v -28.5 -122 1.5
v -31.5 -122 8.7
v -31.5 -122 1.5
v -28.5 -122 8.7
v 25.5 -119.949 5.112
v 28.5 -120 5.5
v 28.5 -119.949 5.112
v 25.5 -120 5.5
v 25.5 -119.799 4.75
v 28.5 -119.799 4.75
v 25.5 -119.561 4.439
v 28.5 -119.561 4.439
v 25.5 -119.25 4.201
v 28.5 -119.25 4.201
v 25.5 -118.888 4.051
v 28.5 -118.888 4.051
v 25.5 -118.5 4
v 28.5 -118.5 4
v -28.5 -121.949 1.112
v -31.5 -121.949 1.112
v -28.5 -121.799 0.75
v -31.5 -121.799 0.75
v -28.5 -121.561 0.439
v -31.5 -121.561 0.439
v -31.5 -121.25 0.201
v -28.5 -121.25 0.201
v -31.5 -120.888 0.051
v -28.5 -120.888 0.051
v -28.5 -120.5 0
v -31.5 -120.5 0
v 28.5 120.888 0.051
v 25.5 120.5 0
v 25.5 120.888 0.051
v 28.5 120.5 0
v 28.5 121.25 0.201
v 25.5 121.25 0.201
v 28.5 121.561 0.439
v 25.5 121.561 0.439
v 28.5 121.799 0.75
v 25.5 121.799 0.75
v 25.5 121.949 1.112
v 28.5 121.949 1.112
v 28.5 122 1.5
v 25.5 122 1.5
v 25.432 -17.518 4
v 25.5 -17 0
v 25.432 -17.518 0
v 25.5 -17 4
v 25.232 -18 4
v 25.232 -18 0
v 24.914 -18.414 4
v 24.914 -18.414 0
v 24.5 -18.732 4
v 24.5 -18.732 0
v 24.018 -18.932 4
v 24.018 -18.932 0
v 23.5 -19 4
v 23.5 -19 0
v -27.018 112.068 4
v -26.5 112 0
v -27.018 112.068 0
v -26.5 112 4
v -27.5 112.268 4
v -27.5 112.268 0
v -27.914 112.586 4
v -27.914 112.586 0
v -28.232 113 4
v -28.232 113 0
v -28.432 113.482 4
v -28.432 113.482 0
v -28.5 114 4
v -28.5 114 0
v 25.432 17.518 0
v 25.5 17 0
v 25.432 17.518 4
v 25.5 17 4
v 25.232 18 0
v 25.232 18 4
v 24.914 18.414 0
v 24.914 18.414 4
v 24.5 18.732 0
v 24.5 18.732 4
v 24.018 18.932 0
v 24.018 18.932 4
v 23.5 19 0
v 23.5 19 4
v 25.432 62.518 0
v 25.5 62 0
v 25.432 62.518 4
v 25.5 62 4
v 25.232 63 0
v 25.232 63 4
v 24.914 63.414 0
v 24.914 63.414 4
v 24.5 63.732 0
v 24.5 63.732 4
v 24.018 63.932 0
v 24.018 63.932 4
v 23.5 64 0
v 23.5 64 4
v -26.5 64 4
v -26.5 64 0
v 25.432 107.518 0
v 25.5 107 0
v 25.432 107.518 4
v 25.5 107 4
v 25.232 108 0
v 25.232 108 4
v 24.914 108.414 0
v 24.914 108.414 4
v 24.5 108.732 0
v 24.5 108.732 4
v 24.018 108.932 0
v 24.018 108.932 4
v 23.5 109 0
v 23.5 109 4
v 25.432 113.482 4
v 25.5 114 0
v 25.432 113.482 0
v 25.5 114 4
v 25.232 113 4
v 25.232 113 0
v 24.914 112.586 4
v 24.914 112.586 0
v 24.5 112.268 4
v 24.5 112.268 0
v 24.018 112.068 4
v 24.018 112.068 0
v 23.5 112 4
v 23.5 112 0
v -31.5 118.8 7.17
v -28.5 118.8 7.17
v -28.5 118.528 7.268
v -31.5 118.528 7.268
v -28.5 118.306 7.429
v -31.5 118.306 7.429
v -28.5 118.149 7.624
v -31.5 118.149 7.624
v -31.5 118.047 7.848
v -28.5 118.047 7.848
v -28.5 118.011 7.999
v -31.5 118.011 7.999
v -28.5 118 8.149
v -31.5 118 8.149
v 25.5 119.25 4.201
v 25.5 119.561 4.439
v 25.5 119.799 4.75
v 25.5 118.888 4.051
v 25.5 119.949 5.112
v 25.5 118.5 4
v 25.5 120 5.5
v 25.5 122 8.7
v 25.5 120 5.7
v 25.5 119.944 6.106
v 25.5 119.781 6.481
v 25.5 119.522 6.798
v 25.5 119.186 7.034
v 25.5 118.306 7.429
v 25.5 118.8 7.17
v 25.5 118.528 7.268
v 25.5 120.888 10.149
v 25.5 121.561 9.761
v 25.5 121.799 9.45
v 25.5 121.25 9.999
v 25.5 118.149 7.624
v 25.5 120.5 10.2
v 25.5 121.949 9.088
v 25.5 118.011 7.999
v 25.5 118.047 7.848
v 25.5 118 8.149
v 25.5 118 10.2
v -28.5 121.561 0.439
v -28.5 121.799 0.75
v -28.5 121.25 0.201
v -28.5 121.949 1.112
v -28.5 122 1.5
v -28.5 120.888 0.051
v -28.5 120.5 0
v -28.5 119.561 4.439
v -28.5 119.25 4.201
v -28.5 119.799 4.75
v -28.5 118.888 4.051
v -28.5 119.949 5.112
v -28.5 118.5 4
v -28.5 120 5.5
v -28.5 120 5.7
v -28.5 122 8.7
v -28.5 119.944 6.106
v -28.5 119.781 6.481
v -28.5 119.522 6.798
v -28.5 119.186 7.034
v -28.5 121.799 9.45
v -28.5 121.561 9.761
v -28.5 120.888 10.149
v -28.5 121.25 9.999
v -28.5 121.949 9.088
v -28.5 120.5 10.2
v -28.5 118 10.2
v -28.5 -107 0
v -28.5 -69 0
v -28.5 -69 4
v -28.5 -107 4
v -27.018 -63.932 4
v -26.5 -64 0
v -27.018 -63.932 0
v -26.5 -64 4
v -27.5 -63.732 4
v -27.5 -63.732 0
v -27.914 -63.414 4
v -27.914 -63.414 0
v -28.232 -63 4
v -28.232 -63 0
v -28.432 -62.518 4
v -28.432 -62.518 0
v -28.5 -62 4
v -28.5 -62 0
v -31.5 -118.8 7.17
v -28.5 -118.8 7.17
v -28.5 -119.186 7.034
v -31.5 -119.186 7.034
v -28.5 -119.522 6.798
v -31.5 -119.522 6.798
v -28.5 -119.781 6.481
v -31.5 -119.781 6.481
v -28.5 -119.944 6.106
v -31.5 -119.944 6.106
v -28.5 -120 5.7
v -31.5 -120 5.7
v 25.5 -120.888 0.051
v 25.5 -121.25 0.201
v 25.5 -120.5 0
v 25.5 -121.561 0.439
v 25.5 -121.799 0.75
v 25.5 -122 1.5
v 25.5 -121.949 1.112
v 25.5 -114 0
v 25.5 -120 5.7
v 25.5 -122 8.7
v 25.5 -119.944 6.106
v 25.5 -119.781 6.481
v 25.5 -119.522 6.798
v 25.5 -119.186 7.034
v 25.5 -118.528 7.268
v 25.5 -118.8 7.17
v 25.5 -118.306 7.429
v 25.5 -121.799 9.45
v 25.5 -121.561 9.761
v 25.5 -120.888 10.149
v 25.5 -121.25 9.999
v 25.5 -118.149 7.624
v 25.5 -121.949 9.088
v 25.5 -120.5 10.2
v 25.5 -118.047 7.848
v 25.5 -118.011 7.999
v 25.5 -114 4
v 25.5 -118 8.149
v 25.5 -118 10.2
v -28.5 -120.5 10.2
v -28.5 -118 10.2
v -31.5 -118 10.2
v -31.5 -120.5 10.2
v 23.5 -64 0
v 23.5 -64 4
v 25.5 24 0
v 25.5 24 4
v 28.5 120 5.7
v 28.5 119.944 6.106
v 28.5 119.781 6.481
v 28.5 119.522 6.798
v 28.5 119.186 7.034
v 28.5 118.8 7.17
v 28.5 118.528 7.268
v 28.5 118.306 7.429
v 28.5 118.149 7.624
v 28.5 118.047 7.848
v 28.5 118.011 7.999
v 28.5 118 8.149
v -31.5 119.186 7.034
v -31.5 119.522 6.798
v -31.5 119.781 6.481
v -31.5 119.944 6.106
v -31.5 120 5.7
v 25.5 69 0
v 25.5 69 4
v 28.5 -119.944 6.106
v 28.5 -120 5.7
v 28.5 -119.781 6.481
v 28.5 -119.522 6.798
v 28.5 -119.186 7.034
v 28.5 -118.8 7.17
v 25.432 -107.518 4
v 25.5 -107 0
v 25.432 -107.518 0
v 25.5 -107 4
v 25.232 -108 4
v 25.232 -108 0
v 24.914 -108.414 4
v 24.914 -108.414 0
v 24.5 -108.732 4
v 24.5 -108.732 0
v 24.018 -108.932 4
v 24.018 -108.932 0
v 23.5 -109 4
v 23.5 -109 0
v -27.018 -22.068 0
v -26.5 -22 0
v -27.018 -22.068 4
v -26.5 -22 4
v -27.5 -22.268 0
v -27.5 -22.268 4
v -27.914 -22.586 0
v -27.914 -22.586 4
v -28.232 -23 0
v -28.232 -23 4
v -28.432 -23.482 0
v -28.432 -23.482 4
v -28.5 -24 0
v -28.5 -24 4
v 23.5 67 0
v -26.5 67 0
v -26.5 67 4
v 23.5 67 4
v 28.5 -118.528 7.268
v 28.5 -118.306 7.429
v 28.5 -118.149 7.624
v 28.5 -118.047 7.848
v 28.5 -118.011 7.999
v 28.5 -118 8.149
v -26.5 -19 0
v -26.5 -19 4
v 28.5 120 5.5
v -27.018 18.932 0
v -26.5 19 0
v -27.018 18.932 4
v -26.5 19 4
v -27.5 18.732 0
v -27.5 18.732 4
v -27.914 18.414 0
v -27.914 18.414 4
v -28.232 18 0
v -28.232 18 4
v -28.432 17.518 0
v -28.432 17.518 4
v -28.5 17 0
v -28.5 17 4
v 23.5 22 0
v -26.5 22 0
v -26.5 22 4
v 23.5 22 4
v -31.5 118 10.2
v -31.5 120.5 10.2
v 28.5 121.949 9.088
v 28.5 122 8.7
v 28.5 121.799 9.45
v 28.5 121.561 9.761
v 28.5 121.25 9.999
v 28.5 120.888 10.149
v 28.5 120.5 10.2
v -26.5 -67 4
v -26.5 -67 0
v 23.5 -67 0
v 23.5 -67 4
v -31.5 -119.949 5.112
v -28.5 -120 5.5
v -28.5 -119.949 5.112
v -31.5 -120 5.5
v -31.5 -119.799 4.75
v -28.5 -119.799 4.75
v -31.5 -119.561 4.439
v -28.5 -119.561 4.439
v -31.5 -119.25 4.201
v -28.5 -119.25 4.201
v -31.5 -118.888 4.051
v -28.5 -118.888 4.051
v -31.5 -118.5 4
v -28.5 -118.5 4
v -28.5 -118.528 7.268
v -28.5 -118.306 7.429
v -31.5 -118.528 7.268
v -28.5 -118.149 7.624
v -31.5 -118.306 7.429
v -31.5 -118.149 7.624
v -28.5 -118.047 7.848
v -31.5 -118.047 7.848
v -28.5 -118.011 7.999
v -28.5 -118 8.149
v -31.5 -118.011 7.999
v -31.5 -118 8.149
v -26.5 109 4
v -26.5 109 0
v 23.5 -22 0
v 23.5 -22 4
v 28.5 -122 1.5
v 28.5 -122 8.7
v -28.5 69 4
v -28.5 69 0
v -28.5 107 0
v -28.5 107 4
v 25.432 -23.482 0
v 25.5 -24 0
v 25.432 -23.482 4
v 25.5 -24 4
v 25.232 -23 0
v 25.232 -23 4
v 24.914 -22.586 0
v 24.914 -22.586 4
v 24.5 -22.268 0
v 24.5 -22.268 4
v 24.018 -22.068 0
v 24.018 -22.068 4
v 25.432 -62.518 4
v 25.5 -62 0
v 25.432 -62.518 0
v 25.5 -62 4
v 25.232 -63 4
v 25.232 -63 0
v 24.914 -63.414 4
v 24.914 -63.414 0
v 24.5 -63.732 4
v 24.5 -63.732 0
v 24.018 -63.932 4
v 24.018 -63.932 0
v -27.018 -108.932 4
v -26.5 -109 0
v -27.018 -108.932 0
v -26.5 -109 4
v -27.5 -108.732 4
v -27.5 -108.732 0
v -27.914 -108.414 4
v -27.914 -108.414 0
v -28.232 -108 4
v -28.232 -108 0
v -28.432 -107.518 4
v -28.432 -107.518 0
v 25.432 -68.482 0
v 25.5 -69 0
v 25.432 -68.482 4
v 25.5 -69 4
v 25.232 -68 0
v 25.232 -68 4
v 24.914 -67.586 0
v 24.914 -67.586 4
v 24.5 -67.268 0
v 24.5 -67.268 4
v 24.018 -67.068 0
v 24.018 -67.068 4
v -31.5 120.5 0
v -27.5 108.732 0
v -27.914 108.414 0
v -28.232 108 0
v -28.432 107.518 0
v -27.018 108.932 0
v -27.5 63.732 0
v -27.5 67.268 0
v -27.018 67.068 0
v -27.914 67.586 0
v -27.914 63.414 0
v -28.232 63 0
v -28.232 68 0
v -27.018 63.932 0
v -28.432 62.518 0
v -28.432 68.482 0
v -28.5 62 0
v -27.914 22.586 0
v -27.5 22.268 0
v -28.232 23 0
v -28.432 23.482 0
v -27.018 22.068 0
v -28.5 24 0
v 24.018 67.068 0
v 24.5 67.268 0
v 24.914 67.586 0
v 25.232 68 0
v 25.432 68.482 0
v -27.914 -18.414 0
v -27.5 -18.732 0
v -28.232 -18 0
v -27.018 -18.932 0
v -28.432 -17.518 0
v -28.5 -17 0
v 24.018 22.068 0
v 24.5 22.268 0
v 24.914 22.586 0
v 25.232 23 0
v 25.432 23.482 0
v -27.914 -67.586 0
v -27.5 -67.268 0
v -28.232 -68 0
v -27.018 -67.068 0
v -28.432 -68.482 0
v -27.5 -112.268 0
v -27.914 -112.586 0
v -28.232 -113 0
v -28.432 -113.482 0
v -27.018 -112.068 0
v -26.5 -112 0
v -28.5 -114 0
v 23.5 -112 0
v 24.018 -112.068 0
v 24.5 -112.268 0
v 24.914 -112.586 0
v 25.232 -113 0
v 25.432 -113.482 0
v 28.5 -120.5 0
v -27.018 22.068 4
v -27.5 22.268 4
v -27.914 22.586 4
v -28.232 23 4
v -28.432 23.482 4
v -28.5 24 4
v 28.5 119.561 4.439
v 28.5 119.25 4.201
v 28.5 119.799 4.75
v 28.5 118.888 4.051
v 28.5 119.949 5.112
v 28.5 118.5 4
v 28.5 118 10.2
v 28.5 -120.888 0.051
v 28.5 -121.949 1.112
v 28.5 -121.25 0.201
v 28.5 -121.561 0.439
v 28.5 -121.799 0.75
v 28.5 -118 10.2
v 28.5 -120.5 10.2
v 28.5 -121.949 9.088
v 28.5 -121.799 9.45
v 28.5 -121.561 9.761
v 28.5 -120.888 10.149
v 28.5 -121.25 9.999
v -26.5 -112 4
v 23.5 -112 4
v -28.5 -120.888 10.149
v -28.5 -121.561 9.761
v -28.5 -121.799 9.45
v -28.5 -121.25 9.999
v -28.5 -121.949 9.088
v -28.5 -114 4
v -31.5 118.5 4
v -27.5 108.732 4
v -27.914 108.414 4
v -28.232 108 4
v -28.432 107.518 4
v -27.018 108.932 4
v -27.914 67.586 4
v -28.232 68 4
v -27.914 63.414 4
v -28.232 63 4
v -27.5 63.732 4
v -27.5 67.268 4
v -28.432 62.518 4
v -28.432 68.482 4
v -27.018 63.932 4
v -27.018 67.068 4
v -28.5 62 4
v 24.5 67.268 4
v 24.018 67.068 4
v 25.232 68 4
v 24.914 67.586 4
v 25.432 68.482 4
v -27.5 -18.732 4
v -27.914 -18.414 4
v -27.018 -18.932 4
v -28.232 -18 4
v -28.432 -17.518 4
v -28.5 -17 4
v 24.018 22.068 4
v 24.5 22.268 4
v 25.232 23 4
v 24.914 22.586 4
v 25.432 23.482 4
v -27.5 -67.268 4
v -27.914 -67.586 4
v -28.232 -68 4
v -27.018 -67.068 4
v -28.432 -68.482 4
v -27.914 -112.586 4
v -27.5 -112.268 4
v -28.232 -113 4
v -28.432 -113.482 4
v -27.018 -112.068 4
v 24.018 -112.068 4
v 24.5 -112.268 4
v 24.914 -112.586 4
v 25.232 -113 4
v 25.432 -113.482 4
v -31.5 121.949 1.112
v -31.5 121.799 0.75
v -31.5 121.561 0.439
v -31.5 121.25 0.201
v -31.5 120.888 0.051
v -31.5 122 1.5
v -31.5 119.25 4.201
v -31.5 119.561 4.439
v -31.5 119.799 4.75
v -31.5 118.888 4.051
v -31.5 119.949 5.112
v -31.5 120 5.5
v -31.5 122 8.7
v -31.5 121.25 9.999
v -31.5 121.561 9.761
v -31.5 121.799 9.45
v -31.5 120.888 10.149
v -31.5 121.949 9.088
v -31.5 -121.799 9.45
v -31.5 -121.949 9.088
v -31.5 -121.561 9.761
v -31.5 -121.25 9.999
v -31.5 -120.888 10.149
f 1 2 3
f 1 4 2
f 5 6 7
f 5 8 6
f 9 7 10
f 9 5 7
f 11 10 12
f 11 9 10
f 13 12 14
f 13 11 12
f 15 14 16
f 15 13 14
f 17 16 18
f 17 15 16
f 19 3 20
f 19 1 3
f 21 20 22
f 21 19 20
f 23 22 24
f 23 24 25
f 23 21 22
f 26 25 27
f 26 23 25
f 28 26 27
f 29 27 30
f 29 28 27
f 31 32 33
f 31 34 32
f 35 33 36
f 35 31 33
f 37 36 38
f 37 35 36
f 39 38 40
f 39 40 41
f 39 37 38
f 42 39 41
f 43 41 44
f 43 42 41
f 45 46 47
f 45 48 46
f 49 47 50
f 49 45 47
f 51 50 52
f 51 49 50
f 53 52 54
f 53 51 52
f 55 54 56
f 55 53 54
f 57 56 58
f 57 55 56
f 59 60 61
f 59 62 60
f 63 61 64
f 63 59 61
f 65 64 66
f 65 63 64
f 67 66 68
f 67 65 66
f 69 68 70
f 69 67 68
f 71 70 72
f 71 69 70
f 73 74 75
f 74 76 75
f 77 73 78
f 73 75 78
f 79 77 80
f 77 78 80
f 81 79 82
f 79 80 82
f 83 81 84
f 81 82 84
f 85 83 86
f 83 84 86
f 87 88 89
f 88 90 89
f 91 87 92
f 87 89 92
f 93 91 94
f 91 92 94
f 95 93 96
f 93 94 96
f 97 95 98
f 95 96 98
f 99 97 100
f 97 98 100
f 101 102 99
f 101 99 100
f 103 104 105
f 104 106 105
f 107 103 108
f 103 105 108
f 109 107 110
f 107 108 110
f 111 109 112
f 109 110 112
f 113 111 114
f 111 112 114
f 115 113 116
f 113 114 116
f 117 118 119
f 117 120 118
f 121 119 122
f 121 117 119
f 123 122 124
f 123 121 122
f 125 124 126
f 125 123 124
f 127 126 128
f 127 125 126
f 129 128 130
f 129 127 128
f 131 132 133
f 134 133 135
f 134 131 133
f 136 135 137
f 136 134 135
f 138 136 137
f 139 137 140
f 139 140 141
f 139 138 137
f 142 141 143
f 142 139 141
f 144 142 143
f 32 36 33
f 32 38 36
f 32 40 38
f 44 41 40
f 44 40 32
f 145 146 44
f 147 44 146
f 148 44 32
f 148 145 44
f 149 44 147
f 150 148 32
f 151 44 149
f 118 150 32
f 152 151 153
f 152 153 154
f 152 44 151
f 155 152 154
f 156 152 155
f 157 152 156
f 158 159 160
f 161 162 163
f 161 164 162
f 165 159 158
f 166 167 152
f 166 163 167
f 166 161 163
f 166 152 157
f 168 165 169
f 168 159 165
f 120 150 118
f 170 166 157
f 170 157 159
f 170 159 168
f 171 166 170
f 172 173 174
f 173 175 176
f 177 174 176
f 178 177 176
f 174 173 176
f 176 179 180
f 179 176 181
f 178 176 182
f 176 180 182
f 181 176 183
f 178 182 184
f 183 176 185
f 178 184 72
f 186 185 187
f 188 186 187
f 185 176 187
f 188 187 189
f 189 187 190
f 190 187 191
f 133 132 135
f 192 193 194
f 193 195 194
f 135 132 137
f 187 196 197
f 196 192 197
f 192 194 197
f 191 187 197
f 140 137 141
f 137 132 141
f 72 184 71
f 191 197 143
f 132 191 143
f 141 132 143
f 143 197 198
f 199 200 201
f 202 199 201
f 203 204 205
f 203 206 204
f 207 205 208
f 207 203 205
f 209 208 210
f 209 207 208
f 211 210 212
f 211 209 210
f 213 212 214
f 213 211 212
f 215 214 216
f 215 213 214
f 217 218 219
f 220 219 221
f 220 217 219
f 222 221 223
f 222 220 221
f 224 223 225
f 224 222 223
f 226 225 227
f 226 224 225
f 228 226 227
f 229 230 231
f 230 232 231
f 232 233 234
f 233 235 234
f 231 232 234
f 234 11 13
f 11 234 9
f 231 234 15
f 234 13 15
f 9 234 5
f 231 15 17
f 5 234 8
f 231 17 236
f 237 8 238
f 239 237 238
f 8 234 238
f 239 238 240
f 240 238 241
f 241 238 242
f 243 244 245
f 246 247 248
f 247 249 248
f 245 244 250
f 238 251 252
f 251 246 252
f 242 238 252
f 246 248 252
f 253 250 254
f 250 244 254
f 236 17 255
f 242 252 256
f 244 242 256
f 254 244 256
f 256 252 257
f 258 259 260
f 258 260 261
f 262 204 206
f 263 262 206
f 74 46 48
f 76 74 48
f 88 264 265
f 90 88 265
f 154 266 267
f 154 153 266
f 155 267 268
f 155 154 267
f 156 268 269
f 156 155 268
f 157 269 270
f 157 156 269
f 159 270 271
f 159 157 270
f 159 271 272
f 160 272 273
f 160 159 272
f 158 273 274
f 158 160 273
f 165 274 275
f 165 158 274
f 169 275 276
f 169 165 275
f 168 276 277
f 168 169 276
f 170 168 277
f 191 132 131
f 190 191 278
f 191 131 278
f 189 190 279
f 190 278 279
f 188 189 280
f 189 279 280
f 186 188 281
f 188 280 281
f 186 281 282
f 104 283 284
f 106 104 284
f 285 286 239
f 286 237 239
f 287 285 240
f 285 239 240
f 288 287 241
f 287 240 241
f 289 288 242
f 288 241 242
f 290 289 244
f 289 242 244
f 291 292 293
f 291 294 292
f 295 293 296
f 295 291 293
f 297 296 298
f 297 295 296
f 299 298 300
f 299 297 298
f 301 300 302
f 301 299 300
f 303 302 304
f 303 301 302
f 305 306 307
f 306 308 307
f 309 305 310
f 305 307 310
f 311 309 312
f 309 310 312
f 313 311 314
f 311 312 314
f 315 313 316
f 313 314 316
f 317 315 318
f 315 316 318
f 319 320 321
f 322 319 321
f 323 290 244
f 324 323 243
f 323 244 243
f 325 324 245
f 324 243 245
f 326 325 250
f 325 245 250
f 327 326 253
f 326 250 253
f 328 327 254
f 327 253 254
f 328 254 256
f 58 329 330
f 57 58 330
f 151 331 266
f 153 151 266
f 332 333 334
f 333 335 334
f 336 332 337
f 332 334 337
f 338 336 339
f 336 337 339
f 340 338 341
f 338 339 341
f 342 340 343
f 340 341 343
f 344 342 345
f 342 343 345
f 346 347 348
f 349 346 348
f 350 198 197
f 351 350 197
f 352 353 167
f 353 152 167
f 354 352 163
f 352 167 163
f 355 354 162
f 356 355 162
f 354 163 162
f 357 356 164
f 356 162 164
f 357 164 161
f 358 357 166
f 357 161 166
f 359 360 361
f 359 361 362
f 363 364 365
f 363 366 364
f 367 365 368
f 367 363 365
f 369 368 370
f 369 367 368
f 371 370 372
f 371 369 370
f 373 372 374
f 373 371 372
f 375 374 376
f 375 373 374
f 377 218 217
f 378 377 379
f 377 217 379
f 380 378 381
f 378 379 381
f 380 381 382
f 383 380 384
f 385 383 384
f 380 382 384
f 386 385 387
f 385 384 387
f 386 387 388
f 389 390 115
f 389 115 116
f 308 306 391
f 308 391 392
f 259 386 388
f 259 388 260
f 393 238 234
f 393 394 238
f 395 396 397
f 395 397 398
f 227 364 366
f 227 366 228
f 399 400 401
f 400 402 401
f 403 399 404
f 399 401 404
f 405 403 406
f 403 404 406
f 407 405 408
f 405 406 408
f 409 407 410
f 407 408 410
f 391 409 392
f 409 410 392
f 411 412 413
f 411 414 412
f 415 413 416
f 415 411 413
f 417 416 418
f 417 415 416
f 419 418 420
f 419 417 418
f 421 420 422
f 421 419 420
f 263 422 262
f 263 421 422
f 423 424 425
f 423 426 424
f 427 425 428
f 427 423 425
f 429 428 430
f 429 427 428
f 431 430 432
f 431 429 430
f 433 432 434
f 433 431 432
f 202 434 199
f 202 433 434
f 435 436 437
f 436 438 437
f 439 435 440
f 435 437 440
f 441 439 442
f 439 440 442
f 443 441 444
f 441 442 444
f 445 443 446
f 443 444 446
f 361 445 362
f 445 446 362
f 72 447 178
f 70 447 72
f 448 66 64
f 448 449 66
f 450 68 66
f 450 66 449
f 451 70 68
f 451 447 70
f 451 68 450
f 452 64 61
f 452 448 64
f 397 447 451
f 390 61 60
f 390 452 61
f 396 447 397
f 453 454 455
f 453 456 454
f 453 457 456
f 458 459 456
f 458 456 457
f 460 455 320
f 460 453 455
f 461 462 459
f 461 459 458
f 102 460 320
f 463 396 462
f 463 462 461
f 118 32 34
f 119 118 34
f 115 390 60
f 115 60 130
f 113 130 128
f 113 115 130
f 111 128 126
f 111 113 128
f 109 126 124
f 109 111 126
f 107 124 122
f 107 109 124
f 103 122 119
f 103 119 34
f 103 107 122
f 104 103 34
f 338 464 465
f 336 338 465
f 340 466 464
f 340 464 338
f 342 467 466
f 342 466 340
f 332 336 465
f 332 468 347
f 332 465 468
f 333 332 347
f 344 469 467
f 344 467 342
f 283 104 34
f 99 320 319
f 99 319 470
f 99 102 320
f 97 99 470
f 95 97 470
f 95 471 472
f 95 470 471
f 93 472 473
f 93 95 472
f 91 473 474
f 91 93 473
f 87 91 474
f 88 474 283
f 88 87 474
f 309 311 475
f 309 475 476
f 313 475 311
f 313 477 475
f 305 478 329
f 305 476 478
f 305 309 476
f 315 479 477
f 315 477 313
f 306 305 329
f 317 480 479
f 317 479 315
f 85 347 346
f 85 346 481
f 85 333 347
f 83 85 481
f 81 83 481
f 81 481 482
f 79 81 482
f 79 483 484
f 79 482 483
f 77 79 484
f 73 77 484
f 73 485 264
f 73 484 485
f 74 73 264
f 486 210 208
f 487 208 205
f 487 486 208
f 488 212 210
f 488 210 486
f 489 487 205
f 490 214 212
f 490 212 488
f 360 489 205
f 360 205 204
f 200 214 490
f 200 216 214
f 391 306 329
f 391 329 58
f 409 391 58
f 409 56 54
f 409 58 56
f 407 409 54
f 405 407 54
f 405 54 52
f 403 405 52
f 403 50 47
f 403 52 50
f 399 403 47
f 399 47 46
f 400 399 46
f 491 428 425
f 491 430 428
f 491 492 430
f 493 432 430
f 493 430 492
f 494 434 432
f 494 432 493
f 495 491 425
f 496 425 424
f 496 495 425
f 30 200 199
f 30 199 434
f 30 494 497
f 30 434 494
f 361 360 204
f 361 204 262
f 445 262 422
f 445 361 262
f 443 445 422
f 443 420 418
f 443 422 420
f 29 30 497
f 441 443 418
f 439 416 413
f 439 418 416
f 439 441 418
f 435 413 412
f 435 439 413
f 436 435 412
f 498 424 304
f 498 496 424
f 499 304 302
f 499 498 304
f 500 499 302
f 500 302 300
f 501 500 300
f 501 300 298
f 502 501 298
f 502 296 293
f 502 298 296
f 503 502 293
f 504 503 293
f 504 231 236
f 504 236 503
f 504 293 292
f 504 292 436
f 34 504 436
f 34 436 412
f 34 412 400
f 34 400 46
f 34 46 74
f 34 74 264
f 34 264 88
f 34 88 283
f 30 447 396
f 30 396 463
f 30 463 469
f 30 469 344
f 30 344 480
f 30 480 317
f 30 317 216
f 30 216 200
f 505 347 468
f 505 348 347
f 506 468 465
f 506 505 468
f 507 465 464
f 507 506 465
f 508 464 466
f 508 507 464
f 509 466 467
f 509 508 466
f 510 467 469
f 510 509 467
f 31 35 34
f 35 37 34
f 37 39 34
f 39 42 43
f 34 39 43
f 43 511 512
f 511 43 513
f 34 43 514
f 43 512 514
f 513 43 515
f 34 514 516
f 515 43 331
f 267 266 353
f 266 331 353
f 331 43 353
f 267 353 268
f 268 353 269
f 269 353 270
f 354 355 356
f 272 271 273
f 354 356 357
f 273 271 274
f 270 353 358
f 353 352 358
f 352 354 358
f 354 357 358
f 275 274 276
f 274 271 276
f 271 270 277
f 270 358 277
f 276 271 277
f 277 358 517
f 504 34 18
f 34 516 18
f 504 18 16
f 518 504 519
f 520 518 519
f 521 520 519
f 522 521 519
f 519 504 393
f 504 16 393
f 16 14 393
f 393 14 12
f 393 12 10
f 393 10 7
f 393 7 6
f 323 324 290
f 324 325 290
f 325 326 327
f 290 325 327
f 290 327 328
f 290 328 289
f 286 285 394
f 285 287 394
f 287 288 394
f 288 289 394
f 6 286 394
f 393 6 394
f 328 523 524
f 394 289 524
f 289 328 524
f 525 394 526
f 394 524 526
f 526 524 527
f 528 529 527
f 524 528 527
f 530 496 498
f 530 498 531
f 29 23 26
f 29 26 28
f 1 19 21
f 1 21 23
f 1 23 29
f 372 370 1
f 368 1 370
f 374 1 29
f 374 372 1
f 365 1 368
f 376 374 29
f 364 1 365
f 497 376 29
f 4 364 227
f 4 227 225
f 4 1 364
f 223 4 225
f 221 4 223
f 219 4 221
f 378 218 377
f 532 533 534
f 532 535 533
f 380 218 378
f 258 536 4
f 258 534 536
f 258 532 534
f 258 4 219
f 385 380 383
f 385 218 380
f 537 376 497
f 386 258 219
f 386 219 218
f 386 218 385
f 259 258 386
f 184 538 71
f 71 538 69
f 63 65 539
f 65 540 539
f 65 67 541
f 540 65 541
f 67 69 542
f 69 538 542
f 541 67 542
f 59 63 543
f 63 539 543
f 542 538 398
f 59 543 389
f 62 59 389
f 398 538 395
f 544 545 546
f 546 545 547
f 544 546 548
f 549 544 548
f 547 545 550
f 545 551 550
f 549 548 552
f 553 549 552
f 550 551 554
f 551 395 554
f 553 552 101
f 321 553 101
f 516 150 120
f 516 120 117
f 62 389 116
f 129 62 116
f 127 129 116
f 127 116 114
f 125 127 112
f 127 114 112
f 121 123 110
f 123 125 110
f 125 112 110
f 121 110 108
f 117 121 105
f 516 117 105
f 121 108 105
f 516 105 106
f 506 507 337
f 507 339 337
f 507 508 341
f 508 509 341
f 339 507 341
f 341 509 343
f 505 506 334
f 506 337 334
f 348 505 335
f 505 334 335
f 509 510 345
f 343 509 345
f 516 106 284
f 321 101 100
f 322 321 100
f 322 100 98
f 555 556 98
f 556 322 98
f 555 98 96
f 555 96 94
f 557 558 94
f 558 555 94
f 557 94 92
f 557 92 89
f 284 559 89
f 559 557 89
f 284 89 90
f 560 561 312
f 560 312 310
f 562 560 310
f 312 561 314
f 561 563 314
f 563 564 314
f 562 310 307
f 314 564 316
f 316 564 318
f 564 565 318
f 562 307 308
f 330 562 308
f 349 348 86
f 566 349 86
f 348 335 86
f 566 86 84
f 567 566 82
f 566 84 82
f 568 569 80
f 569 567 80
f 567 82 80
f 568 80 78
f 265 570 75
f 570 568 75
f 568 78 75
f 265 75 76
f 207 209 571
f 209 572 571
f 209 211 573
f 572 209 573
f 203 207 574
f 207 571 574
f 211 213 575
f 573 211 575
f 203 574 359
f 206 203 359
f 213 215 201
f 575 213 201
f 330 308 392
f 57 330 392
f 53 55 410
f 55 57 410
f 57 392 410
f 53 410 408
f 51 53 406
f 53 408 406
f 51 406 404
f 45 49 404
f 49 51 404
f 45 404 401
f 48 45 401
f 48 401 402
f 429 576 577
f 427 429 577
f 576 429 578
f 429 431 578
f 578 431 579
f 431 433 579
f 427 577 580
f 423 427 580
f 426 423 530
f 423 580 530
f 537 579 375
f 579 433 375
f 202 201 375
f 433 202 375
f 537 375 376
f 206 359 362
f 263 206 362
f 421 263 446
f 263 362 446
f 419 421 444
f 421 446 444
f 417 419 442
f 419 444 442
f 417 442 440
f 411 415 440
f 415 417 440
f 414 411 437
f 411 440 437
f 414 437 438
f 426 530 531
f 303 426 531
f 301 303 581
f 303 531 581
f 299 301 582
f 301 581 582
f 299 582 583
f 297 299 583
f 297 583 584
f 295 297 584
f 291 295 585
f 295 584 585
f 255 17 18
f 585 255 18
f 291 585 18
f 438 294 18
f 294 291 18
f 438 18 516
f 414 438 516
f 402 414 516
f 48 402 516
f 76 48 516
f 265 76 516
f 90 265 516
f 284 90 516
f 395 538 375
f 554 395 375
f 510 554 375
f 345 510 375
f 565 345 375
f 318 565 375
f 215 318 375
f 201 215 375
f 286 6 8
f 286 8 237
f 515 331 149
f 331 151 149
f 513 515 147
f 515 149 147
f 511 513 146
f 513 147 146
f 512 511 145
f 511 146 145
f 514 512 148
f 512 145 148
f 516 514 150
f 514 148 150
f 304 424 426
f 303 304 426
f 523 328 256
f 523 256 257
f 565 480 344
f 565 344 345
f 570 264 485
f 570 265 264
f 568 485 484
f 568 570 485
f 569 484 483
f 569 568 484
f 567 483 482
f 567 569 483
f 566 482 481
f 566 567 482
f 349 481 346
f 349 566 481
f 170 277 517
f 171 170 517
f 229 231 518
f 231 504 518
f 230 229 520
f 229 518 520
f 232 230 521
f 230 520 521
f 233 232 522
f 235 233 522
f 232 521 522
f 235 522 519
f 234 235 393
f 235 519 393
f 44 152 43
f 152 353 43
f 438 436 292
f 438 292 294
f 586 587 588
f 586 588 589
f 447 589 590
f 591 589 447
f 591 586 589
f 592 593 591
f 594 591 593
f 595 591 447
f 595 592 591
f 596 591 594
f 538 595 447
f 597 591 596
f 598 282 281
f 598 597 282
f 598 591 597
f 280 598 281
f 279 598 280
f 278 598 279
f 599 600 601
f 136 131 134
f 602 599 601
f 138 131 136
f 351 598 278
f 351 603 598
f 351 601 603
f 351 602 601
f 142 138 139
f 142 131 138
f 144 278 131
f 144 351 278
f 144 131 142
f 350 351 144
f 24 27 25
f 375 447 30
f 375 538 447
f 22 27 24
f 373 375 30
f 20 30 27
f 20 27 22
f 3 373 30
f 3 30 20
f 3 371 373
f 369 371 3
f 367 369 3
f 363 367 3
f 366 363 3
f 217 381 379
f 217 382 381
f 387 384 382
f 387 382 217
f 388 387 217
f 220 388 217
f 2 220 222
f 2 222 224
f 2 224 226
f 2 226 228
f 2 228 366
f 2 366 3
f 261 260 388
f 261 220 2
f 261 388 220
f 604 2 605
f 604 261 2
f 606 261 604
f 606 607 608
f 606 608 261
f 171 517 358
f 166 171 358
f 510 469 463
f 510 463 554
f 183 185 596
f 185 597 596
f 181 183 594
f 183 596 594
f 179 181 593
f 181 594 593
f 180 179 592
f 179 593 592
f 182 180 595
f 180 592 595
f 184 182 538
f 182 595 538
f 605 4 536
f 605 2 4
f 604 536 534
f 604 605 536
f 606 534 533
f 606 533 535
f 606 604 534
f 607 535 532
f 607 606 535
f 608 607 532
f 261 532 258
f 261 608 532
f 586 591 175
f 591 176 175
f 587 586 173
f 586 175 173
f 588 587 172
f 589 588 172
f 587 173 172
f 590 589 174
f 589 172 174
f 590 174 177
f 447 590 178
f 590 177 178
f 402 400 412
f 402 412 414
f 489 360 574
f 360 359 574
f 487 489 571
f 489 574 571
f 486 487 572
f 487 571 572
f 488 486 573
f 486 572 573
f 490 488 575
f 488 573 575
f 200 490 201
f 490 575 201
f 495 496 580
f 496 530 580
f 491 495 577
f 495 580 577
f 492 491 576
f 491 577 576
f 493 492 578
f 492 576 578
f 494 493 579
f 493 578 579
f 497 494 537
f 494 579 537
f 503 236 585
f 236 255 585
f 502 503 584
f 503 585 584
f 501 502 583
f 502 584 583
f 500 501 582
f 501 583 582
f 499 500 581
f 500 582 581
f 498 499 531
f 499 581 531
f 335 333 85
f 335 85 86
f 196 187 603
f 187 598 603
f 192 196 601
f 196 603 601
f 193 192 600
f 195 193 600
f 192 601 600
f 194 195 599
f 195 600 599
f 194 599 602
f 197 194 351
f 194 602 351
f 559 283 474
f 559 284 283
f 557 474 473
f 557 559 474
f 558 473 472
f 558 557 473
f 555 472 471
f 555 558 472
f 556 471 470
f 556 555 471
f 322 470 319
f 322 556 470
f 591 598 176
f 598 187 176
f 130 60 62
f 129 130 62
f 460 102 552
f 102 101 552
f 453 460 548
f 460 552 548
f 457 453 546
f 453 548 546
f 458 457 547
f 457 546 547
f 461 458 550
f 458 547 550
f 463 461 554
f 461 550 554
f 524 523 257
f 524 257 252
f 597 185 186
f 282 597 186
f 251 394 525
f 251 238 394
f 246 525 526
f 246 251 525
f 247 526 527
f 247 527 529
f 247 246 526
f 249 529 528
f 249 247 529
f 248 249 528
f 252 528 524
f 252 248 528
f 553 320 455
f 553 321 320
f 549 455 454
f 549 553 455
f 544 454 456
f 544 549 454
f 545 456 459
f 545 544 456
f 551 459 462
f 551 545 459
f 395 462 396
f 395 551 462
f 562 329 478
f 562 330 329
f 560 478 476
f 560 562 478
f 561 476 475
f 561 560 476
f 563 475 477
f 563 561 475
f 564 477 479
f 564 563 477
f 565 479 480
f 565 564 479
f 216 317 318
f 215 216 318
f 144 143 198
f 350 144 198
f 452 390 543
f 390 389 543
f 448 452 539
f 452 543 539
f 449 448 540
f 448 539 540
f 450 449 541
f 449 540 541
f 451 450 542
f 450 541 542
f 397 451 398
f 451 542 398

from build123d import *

# Parameters (mm, degrees)
F0_W     = 3
F0_H     = 4
F1_DEPTH = 122
F2_W     = 3
F2_H     = 4
F3_DEPTH = 54
F6_DEPTH = 3
F8_DEPTH = 3
F9_R     = 1.5
F10_R    = 1
F11_R    = 2


with BuildPart() as f1:
    # F0 (on Front) → F1 (new body)
    with BuildSketch(Plane.XZ):
        with Locations((-30, 2)):
            Rectangle(F0_W, F0_H)
    extrude(amount=F1_DEPTH)


with BuildPart() as f1b:
    # F0 (on Front) → F1, piece 2 (new body)
    with BuildSketch(Plane.XZ):
        with Locations((27, 2)):
            Rectangle(F0_W, F0_H)
    extrude(amount=F1_DEPTH)


with BuildPart() as f3:
    # F2 (on face) → F3 (new body, through all)
    with BuildSketch(Plane.YZ.offset(-28.5)):
        with Locations((-110.5, 2)):
            Rectangle(F2_W, F2_H)
    extrude(amount=F3_DEPTH)


with BuildPart() as f3b:
    # F2 (on face) → F3, piece 2 (new body, through all)
    with BuildSketch(Plane.YZ.offset(-28.5)):
        with Locations((-65.5, 2)):
            Rectangle(F2_W, F2_H)
    extrude(amount=F3_DEPTH)


with BuildPart() as f3c:
    # F2 (on face) → F3, piece 3 (new body, through all)
    with BuildSketch(Plane.YZ.offset(-28.5)):
        with Locations((-20.5, 2)):
            Rectangle(F2_W, F2_H)
    extrude(amount=F3_DEPTH)


with BuildPart() as f1_1:
    add(f1.part)

    # F4: union F1b, F3, F3b, F3c
    add(f1b.part)
    add(f3.part)
    add(f3b.part)
    add(f3c.part)

    # F5 (on face) → F6 (join, through all)
    with BuildSketch(Plane.YZ.offset(-28.5)):
        Polygon((-122, 7.2), (-122, 4), (-120, 4), (-120, 7.2), (-118, 7.2), (-118, 10.2), (-122, 10.2), align=None)
    extrude(amount=-F6_DEPTH)

    # F7 (on face) → F8 (join, through all)
    with BuildSketch(Plane.YZ.offset(28.5)):
        Polygon((-122, 7.2), (-122, 4), (-120, 4), (-120, 7.2), (-118, 7.2), (-118, 10.2), (-122, 10.2), align=None)
    extrude(amount=-F8_DEPTH)

    # F9
    f9_edges = [f1_1.edges().sort_by_distance(p)[0] for p in [
        (-30, -122, 0),
        (27, -122, 0),
        (27, -122, 10.2),
        (-30, -122, 10.2),
        (27, -120, 4),
        (27, -120, 7.2),
        (-30, -120, 4),
        (-30, -120, 7.2),
    ]]
    fillet(f9_edges, radius=F9_R)

    # F10
    f10_edges = [f1_1.edges().sort_by_distance(p)[0] for p in [
        (-30, -118, 7.2),
        (27, -118, 7.2),
    ]]
    fillet(f10_edges, radius=F10_R)

    # F11
    f11_edges = [f1_1.edges().sort_by_distance(p)[0] for p in [
        (-28.5, -109, 2),
        (-28.5, -64, 2),
        (25.5, -109, 2),
        (25.5, -22, 2),
        (25.5, -67, 2),
        (-28.5, -67, 2),
        (-28.5, -22, 2),
        (-28.5, -19, 2),
        (-28.5, -112, 2),
        (25.5, -112, 2),
        (25.5, -64, 2),
        (25.5, -19, 2),
    ]]
    fillet(f11_edges, radius=F11_R)

    # F12: F1 across plane


with BuildPart() as f1_2:
    add(f1_1.part)
    add(f1_1.part.mirror(Plane.XZ))


solid = f1_2.part
